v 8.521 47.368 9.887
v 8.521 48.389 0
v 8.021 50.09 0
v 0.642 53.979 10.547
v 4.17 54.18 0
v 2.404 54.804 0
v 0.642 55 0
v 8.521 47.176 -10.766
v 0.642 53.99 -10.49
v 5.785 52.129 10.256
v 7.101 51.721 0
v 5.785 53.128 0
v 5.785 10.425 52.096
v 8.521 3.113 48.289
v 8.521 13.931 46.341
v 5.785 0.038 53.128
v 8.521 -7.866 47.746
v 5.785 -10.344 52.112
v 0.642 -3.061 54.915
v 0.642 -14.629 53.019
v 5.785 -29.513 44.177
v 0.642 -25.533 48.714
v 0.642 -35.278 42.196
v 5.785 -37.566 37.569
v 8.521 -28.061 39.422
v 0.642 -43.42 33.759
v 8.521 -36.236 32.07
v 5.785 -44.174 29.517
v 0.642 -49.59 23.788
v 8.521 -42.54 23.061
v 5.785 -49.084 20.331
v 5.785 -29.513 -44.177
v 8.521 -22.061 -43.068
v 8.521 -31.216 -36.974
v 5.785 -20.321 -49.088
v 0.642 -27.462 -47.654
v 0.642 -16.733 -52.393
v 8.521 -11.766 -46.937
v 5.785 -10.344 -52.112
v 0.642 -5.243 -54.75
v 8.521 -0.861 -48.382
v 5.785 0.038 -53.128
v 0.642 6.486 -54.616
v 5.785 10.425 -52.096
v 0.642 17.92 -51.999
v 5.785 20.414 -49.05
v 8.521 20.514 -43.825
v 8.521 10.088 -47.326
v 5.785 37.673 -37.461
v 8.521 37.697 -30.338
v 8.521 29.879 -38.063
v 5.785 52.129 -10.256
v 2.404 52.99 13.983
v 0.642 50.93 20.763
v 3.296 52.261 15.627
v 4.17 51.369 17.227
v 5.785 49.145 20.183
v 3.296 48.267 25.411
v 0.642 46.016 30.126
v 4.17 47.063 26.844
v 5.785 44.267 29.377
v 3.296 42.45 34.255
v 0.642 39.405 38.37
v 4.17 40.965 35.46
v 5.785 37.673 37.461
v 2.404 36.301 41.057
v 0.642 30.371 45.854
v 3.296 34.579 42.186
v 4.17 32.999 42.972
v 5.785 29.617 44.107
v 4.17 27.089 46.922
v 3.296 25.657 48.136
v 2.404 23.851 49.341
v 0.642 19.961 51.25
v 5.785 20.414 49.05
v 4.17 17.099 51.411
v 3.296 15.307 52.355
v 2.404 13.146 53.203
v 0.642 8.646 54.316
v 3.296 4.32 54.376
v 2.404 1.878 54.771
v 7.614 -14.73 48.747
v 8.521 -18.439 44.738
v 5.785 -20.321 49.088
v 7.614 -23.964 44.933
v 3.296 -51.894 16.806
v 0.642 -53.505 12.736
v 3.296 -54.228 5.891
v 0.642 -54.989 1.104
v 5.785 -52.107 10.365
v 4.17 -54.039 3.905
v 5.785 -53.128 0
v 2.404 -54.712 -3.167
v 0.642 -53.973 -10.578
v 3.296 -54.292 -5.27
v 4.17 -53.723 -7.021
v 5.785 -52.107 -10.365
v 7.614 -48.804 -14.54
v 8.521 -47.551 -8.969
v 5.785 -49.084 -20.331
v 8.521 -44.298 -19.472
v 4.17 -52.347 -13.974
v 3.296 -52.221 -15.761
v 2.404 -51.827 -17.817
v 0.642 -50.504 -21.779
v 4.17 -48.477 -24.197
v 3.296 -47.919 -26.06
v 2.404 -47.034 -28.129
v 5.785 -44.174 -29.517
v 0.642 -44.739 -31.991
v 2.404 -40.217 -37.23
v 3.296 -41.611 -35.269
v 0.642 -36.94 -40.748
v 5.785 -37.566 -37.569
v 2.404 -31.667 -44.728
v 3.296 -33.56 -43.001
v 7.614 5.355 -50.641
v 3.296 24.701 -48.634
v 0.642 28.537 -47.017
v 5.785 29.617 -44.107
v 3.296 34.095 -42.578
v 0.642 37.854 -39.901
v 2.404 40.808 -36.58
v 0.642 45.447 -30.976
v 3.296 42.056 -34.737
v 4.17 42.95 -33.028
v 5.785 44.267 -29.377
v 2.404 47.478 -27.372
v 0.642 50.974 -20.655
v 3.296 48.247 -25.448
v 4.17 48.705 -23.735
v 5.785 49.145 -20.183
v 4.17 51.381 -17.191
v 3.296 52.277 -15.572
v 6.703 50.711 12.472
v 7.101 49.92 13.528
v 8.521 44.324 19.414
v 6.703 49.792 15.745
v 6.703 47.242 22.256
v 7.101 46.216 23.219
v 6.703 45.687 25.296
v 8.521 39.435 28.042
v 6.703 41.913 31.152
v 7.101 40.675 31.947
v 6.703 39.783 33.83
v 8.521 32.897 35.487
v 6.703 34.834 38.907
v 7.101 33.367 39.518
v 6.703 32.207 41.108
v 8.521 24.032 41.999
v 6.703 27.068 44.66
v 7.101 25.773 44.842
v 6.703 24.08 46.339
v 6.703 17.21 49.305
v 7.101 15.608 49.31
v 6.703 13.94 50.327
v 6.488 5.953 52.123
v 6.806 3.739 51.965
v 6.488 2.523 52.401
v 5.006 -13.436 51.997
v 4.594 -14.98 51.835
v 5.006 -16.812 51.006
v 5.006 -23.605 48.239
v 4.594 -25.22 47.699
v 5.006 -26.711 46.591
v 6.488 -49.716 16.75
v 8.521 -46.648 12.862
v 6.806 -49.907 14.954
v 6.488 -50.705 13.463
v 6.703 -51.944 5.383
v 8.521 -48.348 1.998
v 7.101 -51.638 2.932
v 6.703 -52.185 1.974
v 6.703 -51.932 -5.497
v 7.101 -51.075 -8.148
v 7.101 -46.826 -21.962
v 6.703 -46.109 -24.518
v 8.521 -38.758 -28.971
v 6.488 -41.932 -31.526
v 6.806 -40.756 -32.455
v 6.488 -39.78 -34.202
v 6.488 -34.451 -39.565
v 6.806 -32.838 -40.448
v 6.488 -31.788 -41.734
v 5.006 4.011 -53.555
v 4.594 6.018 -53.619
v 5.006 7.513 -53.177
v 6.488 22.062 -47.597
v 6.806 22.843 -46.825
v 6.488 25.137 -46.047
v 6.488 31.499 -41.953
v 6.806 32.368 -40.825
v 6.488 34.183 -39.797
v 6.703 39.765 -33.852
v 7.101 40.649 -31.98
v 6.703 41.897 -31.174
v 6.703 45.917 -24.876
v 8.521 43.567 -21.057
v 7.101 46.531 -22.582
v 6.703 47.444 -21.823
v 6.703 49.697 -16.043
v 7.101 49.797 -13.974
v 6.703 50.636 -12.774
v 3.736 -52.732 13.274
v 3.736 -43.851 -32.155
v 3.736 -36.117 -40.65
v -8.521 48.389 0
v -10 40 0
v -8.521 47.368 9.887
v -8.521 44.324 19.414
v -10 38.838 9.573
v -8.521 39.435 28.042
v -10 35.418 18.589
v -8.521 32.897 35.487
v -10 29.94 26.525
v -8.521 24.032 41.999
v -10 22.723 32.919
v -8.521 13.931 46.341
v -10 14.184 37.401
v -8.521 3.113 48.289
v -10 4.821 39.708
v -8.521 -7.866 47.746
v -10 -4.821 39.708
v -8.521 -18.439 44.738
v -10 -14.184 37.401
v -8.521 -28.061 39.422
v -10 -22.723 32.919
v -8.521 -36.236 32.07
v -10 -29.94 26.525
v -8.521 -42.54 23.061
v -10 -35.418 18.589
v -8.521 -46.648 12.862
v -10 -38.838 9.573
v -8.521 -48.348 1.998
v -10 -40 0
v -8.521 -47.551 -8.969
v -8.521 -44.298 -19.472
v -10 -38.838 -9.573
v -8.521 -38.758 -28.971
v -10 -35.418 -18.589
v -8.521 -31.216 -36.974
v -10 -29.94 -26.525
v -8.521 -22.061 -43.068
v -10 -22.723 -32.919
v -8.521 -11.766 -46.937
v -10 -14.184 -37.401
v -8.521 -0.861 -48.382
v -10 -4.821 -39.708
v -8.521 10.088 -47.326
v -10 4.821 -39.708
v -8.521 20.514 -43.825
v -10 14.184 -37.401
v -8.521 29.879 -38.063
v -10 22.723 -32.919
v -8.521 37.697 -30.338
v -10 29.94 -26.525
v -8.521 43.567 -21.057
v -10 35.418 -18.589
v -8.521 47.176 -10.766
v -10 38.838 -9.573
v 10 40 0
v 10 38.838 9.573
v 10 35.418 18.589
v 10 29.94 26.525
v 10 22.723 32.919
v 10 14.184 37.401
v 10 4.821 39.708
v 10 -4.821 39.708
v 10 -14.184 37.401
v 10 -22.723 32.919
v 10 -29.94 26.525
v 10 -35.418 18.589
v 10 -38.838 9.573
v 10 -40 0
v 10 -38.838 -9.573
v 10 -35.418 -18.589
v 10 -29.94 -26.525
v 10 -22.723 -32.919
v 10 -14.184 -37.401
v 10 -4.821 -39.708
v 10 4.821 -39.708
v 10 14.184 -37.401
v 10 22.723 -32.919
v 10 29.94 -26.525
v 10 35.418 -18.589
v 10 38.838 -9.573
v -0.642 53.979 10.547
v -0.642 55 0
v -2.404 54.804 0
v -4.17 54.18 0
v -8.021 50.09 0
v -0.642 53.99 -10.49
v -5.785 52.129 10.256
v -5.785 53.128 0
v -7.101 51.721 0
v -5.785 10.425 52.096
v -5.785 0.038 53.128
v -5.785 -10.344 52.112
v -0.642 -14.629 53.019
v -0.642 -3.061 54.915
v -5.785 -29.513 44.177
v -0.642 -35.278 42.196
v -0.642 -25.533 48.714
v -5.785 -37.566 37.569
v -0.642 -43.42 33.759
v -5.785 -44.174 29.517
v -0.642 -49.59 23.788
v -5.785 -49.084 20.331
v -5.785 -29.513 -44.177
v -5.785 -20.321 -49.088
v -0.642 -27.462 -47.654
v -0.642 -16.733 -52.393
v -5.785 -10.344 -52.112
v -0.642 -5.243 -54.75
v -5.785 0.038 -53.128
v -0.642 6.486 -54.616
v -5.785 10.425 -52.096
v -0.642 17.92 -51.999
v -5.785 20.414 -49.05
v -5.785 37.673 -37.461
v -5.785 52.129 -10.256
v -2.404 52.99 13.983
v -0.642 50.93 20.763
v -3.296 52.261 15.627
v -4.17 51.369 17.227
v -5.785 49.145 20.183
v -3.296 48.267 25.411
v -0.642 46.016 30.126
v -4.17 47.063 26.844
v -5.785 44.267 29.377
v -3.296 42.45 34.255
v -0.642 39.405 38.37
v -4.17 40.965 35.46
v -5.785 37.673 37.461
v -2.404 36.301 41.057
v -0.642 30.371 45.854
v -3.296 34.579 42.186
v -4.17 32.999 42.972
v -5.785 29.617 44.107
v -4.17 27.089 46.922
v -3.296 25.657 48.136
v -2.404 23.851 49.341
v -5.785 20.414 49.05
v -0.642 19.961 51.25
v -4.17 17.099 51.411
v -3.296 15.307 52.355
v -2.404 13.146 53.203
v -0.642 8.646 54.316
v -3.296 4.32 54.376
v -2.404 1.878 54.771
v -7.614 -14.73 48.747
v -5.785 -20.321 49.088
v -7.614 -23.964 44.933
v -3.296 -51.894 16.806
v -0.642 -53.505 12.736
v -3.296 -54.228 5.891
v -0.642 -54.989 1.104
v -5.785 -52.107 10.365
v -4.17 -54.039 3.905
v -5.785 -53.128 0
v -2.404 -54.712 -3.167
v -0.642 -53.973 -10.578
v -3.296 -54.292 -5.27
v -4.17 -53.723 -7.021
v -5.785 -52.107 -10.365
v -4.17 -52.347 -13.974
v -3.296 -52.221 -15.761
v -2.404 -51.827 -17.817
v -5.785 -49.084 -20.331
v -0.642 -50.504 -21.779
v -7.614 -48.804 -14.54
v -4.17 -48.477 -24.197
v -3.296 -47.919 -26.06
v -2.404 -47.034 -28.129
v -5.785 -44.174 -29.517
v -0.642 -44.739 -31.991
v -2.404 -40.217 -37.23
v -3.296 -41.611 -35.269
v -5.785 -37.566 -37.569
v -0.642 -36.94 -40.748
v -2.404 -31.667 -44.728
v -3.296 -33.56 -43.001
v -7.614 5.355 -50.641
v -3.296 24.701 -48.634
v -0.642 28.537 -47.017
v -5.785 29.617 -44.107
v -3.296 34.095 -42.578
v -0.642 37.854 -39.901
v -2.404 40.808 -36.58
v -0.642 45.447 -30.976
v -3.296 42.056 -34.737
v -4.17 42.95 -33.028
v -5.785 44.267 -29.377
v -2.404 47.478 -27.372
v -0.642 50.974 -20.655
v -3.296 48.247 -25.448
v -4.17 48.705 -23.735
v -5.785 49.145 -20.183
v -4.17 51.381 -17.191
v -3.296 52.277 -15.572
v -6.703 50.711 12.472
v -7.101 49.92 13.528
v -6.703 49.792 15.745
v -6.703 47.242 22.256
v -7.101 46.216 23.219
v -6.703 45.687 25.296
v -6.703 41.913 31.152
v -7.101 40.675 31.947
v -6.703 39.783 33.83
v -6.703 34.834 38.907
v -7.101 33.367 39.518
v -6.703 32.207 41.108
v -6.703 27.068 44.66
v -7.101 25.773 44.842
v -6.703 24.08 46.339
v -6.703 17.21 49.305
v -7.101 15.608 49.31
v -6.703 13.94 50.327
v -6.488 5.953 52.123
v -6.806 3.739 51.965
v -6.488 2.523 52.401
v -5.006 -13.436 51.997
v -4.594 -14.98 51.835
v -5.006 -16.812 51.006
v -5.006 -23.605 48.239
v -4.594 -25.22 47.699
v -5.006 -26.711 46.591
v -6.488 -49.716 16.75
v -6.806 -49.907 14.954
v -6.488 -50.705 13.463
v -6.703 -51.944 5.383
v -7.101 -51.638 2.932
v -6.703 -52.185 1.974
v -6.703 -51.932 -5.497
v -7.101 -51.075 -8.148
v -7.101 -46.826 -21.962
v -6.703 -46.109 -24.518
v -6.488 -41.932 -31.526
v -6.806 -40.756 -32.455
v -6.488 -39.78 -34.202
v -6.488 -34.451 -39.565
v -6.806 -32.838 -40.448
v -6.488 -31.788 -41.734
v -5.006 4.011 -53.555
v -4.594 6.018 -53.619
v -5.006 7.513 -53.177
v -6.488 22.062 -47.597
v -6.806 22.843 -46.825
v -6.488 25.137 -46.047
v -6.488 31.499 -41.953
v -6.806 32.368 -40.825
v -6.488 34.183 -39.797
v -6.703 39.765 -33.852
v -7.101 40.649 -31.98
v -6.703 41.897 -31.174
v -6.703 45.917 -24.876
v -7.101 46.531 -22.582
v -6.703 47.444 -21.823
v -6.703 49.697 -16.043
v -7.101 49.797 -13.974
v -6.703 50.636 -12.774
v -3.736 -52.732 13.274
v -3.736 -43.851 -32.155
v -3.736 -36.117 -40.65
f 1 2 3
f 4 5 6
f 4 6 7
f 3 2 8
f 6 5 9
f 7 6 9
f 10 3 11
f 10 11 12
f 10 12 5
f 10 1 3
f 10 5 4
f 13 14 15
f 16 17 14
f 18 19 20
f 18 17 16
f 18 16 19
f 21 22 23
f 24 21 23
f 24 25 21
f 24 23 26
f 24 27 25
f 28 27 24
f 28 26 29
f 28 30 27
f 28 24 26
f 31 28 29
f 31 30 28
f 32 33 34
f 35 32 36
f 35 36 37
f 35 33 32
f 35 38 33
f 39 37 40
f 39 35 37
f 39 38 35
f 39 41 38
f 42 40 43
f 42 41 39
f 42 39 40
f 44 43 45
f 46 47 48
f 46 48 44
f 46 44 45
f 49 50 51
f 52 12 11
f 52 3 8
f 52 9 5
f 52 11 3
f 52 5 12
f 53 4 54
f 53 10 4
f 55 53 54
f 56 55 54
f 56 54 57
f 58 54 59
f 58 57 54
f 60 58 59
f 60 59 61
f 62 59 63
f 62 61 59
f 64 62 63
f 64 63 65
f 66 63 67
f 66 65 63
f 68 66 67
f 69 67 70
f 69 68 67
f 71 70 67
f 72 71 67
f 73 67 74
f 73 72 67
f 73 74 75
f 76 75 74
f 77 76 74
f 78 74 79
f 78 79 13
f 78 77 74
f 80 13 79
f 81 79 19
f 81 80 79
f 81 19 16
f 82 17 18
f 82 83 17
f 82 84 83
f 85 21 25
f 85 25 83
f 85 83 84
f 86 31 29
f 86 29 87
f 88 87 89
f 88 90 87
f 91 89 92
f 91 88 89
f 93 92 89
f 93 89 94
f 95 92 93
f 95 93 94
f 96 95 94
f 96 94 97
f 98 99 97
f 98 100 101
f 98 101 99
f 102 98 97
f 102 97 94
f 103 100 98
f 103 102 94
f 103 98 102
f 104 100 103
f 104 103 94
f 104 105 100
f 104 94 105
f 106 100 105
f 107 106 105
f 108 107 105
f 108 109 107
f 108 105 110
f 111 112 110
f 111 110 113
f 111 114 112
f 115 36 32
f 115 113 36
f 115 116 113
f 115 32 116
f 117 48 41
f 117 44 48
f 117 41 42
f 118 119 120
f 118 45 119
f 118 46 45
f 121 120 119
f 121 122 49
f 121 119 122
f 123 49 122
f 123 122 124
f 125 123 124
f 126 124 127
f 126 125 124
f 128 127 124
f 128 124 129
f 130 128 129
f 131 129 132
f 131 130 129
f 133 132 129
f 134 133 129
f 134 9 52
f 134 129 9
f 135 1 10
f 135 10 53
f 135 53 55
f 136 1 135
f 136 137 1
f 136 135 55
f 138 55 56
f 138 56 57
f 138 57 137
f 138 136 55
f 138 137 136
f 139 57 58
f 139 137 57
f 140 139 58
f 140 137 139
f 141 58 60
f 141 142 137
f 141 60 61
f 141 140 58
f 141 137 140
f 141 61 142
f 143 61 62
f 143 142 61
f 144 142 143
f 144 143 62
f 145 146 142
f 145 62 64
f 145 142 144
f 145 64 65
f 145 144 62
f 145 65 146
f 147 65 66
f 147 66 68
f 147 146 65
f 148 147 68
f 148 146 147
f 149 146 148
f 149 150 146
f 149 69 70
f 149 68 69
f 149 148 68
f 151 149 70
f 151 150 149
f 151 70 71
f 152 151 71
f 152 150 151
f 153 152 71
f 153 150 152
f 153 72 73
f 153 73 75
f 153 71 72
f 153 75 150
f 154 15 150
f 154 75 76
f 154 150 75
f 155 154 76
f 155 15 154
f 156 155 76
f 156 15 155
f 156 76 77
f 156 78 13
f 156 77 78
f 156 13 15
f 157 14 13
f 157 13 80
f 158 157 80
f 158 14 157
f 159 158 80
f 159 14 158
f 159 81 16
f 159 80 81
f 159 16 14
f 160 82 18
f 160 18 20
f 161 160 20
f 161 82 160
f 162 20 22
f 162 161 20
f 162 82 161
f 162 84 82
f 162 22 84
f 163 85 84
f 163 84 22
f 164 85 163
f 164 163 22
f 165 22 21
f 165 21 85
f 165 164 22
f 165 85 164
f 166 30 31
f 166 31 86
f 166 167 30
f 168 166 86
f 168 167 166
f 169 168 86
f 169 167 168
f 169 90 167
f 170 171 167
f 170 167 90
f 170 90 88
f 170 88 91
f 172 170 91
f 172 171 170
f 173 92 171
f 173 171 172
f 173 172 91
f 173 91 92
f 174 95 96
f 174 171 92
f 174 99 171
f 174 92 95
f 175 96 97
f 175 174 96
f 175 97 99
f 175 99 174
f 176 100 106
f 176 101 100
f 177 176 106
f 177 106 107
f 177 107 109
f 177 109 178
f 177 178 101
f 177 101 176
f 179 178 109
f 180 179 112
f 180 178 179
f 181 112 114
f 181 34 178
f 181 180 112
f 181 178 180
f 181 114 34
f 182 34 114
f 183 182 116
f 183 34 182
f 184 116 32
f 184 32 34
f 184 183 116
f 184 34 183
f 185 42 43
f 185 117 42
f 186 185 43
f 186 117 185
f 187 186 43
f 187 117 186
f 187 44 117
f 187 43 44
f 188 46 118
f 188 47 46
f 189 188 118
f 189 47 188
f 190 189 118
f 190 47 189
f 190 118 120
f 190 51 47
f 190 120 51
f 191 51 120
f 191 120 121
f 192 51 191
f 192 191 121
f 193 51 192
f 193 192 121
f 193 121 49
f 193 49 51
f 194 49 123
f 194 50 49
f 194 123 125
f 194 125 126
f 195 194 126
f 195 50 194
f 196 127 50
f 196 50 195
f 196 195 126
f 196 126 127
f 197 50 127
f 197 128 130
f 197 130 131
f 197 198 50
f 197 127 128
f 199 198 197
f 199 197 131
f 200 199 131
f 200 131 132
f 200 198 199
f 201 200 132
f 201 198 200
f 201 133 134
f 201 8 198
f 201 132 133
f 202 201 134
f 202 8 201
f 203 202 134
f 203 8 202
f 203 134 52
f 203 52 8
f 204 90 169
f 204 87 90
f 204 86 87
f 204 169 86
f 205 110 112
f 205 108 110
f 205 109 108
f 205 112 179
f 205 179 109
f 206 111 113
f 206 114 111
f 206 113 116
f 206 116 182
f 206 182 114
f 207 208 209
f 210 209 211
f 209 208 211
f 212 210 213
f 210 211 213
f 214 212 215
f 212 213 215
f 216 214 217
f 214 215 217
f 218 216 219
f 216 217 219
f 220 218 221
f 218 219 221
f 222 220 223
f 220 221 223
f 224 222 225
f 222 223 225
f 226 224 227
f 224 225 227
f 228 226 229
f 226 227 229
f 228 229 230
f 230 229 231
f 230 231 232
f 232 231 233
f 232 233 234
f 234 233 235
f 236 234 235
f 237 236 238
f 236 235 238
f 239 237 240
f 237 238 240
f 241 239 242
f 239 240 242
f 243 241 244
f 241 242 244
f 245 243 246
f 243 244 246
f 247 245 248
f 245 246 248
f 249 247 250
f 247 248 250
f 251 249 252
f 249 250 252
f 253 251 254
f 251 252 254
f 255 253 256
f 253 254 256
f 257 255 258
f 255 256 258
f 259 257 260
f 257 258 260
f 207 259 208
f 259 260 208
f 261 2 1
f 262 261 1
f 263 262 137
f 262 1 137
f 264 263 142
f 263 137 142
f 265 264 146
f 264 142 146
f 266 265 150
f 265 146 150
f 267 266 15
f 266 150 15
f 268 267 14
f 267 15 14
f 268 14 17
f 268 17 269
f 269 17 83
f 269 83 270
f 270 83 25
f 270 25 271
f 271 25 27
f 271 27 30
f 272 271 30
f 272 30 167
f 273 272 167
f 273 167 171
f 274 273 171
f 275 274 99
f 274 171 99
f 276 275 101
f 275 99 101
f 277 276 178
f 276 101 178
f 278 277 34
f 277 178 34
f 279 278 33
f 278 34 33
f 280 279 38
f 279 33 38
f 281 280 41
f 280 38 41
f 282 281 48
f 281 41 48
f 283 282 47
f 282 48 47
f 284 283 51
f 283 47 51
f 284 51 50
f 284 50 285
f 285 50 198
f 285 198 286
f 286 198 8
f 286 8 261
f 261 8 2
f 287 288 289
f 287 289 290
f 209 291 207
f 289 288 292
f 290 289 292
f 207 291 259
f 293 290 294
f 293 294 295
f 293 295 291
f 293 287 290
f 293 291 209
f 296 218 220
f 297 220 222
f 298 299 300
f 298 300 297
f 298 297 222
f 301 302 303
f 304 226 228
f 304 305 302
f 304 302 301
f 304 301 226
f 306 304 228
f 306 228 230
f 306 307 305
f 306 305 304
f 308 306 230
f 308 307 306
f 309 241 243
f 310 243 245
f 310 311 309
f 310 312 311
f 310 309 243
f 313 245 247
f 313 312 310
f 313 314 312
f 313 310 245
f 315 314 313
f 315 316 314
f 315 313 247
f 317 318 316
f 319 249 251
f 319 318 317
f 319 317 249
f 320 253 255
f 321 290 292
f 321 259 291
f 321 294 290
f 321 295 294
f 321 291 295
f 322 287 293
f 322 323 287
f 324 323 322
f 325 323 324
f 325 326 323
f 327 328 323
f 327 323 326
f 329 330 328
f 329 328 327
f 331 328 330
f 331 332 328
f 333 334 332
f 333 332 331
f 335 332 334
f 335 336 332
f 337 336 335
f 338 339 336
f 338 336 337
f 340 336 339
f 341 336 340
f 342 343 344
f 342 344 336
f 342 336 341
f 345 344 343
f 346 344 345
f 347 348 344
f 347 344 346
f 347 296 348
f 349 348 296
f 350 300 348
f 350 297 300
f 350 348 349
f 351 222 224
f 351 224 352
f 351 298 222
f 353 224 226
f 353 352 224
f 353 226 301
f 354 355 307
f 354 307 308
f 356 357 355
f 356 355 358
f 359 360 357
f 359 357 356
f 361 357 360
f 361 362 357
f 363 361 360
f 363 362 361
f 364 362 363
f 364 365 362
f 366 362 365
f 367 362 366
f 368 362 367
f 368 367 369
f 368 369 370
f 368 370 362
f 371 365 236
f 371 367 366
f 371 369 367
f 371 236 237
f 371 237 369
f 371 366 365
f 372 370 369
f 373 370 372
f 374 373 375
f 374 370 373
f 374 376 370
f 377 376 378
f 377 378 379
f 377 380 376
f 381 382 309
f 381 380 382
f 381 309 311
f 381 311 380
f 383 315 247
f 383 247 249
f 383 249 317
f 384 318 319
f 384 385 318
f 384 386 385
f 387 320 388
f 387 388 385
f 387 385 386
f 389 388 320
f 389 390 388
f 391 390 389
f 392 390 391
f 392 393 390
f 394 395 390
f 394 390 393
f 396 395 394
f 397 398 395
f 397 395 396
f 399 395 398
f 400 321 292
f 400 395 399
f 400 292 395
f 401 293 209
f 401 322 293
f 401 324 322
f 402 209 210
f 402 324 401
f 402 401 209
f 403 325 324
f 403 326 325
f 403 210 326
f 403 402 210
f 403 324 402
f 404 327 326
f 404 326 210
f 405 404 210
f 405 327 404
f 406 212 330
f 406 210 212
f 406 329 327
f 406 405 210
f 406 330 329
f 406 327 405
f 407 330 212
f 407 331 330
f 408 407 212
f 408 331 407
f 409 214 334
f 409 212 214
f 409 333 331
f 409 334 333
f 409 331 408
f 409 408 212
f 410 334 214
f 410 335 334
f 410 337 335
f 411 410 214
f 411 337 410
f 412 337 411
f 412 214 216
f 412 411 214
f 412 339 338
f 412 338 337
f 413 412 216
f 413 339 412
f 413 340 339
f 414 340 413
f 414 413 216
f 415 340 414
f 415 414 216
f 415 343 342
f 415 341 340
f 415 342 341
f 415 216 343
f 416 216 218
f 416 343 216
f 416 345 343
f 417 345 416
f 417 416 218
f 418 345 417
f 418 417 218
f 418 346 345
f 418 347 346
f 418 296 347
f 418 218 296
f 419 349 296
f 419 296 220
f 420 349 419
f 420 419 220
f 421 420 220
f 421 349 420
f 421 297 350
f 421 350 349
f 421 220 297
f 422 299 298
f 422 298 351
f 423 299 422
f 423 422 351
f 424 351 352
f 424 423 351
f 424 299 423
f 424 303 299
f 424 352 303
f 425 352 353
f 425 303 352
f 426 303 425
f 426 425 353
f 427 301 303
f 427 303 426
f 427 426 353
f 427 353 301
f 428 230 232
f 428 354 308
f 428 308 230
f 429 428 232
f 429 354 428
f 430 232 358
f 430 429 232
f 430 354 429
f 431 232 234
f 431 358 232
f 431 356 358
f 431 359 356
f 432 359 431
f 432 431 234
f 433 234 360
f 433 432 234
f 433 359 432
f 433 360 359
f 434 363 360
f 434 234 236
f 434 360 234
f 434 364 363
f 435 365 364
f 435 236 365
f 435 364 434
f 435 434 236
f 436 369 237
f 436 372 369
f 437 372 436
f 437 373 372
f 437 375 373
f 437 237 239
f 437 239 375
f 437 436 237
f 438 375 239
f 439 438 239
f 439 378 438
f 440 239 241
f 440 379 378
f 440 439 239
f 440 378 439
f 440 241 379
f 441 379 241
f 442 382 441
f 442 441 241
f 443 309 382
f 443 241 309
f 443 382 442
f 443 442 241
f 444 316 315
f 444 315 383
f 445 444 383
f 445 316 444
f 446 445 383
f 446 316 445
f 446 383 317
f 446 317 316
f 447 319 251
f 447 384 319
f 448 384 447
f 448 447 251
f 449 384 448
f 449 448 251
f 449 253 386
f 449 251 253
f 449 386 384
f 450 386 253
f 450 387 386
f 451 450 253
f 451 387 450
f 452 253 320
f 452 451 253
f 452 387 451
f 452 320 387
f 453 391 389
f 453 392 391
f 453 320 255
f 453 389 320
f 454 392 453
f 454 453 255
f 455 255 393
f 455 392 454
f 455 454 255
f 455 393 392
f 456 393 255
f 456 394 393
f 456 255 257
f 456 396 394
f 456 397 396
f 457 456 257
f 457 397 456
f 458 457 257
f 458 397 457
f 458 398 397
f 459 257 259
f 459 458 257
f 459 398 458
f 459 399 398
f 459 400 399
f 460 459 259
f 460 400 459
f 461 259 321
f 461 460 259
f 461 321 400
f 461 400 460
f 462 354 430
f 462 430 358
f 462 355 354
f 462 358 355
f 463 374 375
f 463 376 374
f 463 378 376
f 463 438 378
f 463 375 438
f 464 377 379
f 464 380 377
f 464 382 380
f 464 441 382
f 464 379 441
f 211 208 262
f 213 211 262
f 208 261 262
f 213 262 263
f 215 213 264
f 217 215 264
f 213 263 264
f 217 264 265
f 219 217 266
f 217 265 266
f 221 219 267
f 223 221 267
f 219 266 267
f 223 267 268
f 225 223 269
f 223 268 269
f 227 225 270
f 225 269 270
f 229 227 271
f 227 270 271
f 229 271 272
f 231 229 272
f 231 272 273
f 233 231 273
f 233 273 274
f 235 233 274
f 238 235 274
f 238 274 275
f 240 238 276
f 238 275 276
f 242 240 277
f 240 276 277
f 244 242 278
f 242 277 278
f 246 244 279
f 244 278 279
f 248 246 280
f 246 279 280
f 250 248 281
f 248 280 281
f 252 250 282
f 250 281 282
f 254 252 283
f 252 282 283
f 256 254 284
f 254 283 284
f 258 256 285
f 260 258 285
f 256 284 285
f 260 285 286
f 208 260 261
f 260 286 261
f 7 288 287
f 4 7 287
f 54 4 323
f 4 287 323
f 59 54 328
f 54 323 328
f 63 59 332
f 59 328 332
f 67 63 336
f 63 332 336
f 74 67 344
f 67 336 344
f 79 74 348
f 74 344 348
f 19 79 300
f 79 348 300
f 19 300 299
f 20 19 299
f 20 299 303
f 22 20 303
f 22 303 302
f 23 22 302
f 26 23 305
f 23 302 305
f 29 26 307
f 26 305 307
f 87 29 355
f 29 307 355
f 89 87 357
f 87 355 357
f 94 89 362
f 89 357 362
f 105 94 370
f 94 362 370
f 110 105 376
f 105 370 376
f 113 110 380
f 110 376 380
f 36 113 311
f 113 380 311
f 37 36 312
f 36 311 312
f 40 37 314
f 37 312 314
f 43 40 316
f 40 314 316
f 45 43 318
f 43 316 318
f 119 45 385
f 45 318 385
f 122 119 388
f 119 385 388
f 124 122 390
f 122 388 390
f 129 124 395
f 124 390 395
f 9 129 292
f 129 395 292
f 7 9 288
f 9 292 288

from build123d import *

# Parameters (mm, degrees)
FILLET1_R = 8
FILLET2_R = 8


with BuildPart() as part:
    # Sketch1 → Revolve1 (revolve)
    with BuildSketch(Plane.XY):
        Polygon((-10, 40), (10, 40), (7.355095289, 55), (-7.355095289, 55), align=None)
    revolve(axis=Axis((0, 0, 0), (1, 0, 0)))

    # Fillet1
    fillet1_edges = [part.edges().sort_by_distance(p)[0] for p in [
        (7.355095289, -55, 0),
    ]]
    fillet(fillet1_edges, radius=FILLET1_R)

    # Fillet2
    fillet2_edges = [part.edges().sort_by_distance(p)[0] for p in [
        (-7.355095289, -55, 0),
    ]]
    fillet(fillet2_edges, radius=FILLET2_R)


solid = part.part
